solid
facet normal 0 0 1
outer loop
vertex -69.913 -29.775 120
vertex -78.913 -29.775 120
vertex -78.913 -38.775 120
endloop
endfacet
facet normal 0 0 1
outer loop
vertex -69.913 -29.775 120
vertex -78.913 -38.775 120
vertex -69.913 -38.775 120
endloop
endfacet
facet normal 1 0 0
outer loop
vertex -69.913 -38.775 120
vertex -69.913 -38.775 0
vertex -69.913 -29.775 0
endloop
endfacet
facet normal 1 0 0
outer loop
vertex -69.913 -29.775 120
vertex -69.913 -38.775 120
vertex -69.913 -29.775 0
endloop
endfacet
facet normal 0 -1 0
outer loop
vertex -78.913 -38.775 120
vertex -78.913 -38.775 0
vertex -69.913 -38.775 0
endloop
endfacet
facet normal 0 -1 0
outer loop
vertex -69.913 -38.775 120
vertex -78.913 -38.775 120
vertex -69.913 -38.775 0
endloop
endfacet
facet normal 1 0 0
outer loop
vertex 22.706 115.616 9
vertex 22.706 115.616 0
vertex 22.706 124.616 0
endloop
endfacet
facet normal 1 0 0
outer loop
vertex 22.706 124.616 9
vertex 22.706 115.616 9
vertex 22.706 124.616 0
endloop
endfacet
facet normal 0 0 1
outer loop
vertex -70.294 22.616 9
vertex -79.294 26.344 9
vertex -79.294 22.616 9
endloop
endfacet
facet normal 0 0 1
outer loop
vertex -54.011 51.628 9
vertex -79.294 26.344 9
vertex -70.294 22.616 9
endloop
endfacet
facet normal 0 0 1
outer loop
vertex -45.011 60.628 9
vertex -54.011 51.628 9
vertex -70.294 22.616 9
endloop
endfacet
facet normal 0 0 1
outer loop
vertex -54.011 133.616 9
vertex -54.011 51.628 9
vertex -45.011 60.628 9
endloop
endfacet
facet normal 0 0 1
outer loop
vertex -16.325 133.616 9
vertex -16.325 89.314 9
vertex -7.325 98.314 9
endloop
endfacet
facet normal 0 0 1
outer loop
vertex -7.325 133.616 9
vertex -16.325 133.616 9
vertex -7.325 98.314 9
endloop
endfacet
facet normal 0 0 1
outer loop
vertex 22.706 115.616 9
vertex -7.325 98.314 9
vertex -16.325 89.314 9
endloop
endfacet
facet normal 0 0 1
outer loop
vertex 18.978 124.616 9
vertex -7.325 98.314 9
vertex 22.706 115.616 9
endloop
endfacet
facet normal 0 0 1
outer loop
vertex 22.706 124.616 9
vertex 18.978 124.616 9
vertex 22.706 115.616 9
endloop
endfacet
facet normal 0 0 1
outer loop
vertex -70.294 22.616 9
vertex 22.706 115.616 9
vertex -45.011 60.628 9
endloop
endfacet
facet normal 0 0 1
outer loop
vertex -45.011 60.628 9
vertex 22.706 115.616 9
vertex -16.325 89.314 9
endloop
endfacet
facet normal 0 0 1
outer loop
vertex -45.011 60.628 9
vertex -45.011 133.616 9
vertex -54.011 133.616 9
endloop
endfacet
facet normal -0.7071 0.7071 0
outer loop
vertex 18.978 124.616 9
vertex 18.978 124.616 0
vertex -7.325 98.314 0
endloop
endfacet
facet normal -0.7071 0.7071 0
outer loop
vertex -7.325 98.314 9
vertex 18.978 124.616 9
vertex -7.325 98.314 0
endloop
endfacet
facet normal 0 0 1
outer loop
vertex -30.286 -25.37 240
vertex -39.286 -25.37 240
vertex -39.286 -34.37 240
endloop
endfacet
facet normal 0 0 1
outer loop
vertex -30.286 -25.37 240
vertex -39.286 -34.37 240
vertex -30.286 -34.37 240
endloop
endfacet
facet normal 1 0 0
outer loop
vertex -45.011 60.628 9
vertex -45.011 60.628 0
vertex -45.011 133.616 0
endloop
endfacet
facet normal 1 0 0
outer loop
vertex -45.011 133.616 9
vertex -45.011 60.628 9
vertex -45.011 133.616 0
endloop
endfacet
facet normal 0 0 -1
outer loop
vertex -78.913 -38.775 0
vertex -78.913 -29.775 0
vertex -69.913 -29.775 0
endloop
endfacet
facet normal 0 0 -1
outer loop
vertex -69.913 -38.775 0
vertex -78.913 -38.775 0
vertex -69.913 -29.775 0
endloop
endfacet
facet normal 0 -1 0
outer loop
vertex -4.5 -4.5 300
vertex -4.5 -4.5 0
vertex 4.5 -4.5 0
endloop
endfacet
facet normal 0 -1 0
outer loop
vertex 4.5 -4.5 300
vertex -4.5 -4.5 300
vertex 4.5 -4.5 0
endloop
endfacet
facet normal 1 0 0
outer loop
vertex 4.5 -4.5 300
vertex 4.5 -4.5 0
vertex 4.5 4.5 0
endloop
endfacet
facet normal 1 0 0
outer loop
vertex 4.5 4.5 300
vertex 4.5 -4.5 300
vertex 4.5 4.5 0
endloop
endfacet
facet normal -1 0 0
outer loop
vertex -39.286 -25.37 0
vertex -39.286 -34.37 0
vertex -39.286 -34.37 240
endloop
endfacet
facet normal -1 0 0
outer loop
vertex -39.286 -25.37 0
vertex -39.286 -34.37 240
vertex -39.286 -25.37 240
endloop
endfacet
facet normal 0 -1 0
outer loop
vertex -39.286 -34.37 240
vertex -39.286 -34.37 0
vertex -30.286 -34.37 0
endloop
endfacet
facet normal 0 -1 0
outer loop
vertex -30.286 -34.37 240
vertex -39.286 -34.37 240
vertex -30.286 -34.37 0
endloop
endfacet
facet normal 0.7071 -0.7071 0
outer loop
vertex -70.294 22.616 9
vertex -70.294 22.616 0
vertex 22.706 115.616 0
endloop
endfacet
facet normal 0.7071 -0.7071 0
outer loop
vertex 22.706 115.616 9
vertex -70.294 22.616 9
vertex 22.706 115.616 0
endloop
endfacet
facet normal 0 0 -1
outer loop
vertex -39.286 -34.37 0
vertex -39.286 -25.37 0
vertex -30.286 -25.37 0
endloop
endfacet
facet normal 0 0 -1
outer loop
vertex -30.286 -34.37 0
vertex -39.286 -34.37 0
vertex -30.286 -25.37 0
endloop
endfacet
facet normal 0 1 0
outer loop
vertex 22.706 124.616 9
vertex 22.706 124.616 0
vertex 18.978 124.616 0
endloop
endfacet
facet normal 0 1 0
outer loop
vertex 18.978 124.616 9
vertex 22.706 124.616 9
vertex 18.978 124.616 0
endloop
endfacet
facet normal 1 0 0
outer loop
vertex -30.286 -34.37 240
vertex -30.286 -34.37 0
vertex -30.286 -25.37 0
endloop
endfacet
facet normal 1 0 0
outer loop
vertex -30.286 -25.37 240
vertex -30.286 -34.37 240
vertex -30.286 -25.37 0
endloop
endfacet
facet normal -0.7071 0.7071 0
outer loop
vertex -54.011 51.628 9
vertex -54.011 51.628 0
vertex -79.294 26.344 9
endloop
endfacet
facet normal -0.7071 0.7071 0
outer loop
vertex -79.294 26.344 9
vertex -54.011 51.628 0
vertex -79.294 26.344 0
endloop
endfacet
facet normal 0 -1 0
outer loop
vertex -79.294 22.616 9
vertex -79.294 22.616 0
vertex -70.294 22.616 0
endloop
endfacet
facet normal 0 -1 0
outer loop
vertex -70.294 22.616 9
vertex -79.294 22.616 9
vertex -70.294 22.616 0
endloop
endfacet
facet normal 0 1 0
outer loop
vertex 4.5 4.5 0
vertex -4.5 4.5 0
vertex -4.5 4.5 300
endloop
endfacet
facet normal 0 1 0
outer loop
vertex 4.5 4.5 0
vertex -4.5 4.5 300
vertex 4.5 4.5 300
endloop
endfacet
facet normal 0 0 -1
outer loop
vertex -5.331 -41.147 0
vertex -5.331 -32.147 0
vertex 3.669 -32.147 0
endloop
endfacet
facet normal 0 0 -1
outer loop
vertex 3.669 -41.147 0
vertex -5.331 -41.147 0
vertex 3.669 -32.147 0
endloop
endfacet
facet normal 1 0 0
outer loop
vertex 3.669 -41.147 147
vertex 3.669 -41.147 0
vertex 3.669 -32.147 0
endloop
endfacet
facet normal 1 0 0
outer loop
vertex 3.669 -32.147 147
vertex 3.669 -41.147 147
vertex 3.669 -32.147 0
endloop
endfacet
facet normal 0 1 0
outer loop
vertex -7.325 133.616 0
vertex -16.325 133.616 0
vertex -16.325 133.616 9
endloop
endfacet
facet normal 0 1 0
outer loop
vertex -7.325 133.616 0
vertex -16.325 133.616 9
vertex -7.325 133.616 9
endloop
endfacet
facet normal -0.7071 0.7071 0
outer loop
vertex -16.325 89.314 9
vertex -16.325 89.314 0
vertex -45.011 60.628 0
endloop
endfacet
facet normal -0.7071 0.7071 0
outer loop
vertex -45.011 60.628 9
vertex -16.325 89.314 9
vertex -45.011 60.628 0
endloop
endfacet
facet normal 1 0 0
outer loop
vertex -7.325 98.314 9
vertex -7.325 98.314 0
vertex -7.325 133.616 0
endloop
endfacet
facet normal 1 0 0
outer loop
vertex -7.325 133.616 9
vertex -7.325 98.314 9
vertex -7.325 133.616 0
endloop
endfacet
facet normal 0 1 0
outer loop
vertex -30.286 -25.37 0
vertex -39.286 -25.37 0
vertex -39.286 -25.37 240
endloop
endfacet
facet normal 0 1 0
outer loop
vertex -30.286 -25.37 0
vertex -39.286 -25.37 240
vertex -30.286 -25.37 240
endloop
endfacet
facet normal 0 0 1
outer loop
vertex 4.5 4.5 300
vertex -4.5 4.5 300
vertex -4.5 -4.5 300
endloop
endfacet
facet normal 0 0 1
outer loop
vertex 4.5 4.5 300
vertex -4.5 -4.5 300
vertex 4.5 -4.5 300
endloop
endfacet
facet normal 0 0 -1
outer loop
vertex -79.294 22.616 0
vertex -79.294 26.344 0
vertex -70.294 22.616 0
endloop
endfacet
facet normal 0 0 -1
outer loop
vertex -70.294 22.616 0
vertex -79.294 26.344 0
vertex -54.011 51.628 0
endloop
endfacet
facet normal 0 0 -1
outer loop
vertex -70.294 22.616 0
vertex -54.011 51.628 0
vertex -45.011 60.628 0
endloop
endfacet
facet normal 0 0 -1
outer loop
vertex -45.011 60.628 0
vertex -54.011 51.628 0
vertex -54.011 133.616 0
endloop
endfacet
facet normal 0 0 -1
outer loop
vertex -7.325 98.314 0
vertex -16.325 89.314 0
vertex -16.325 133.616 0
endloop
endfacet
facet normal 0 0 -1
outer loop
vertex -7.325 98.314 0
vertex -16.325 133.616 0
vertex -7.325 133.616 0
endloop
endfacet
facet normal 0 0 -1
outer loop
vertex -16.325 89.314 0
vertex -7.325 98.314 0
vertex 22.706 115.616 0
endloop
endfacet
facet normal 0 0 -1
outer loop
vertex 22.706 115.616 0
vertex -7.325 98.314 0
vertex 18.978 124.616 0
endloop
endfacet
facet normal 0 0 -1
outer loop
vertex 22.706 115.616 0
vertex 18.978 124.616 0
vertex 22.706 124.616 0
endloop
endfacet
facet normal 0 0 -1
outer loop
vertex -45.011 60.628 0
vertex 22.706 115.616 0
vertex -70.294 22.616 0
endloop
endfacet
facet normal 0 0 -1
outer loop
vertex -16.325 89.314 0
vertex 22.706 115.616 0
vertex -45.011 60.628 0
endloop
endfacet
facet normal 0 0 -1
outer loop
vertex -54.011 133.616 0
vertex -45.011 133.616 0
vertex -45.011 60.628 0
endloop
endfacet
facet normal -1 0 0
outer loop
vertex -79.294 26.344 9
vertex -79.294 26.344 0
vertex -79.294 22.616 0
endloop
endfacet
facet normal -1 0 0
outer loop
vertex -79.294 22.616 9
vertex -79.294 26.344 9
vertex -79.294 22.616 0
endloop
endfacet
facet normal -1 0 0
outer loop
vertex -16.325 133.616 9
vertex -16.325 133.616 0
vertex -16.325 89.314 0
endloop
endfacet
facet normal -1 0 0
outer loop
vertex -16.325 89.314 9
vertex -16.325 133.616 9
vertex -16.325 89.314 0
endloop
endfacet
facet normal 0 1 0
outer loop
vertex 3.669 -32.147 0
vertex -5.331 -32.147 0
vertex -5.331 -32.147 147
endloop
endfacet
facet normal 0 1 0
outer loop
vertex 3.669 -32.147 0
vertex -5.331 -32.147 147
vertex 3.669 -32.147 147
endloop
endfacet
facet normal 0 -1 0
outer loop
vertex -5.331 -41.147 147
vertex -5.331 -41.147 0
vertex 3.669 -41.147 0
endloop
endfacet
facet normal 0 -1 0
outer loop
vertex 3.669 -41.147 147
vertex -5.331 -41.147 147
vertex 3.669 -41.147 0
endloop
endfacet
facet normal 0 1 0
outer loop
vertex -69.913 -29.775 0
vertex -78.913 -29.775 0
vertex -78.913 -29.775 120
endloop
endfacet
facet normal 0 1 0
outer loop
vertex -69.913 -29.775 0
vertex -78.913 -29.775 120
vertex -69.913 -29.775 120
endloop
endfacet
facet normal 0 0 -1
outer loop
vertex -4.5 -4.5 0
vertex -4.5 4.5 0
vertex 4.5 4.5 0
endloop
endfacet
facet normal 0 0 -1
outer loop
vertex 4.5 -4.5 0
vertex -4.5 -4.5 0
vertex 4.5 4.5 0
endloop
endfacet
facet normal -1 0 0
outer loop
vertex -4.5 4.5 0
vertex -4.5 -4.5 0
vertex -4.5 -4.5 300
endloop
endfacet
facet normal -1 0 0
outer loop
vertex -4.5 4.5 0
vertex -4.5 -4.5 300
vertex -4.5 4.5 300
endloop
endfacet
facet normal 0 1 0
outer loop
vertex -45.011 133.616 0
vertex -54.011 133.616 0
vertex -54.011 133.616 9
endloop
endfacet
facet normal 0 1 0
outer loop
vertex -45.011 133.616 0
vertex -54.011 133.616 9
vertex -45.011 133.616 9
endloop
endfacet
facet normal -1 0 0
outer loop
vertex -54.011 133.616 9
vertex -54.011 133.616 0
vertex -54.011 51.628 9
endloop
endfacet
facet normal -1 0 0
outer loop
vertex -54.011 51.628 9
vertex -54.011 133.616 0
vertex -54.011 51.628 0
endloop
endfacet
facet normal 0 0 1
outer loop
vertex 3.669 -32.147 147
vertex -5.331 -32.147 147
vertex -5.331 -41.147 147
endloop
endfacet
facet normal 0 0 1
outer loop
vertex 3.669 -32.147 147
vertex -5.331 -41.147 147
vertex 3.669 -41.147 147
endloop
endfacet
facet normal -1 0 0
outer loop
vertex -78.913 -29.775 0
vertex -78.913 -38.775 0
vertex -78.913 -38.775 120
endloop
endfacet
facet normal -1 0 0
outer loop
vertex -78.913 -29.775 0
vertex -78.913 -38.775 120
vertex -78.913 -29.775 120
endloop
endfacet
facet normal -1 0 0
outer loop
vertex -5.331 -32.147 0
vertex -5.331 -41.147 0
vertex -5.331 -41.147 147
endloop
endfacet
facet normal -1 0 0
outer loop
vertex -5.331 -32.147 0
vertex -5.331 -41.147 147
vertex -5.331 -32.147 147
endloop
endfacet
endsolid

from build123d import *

# Parameters (mm, degrees)
F0_W     = 9
F0_H     = 9
F1_DEPTH = 300
F2_W     = 9
F2_H     = 9
F3_DEPTH = 120
F4_W     = 9
F4_H     = 9
F5_DEPTH = 240
F6_W     = 9
F6_H     = 5.27208
F7_DEPTH = 9
F8_W     = 9
F8_H     = 9
F9_DEPTH = 147


# Not quite as in the source:
# - a feature names something its author has since deleted; it is built from what else it names


with BuildPart() as f1:
    # F0 (on Top) → F1 (new body)
    with BuildSketch(Plane.XY):
        Rectangle(F0_W, F0_H)
    extrude(amount=F1_DEPTH)


with BuildPart() as f3:
    # F2 (on Top) → F3 (new body)
    with BuildSketch(Plane.XY):
        with Locations((-74.4131075144, -34.275306195)):
            Rectangle(F2_W, F2_H)
    extrude(amount=F3_DEPTH)


with BuildPart() as f5:
    # F4 (on Top) → F5 (new body)
    with BuildSketch(Plane.XY):
        with Locations((-34.7862875015, -29.8701094389)):
            Rectangle(F4_W, F4_H)
    extrude(amount=F5_DEPTH)


with BuildPart() as f7:
    # F6 (on Top) → F7 (new body)
    with BuildSketch(Plane.XY):
        Polygon((-45.0111036971, 60.6276517883), (-54.0111036971, 51.6276517883), (-79.2943466264, 26.3444088591), (-79.2943466264, 22.6164888591), (-70.294344565, 22.6164888591), (22.7056533736, 115.6164867977), (22.7056533736, 124.6164888591), (18.9777333736, 124.6164888591), (-7.3252493367, 98.3135061488), (-16.3252493367, 89.3135061488), align=None)
        Polygon((-45.0111036971, 128.3444088591), (-54.0111036971, 128.3444088591), (-54.0111036971, 51.6276517883), (-45.0111036971, 60.6276517883), align=None)
        with Locations((-49.5111036971, 130.9804488591)):
            Rectangle(F6_W, F6_H)
        Polygon((-7.3252493367, 128.3444088591), (-16.3252493367, 128.3444088591), (-16.3252493367, 89.3135061488), (-7.3252493367, 98.3135061488), align=None)
        with Locations((-11.8252493367, 130.9804488591)):
            Rectangle(F6_W, F6_H)
    extrude(amount=F7_DEPTH)


with BuildPart() as f9:
    # F8 (on Top) → F9 (new body)
    with BuildSketch(Plane.XY):
        with Locations((-0.8312522359, -36.646684438)):
            Rectangle(F8_W, F8_H)
    extrude(amount=F9_DEPTH)


solid = Compound([f1.part, f3.part, f5.part, f7.part, f9.part])
